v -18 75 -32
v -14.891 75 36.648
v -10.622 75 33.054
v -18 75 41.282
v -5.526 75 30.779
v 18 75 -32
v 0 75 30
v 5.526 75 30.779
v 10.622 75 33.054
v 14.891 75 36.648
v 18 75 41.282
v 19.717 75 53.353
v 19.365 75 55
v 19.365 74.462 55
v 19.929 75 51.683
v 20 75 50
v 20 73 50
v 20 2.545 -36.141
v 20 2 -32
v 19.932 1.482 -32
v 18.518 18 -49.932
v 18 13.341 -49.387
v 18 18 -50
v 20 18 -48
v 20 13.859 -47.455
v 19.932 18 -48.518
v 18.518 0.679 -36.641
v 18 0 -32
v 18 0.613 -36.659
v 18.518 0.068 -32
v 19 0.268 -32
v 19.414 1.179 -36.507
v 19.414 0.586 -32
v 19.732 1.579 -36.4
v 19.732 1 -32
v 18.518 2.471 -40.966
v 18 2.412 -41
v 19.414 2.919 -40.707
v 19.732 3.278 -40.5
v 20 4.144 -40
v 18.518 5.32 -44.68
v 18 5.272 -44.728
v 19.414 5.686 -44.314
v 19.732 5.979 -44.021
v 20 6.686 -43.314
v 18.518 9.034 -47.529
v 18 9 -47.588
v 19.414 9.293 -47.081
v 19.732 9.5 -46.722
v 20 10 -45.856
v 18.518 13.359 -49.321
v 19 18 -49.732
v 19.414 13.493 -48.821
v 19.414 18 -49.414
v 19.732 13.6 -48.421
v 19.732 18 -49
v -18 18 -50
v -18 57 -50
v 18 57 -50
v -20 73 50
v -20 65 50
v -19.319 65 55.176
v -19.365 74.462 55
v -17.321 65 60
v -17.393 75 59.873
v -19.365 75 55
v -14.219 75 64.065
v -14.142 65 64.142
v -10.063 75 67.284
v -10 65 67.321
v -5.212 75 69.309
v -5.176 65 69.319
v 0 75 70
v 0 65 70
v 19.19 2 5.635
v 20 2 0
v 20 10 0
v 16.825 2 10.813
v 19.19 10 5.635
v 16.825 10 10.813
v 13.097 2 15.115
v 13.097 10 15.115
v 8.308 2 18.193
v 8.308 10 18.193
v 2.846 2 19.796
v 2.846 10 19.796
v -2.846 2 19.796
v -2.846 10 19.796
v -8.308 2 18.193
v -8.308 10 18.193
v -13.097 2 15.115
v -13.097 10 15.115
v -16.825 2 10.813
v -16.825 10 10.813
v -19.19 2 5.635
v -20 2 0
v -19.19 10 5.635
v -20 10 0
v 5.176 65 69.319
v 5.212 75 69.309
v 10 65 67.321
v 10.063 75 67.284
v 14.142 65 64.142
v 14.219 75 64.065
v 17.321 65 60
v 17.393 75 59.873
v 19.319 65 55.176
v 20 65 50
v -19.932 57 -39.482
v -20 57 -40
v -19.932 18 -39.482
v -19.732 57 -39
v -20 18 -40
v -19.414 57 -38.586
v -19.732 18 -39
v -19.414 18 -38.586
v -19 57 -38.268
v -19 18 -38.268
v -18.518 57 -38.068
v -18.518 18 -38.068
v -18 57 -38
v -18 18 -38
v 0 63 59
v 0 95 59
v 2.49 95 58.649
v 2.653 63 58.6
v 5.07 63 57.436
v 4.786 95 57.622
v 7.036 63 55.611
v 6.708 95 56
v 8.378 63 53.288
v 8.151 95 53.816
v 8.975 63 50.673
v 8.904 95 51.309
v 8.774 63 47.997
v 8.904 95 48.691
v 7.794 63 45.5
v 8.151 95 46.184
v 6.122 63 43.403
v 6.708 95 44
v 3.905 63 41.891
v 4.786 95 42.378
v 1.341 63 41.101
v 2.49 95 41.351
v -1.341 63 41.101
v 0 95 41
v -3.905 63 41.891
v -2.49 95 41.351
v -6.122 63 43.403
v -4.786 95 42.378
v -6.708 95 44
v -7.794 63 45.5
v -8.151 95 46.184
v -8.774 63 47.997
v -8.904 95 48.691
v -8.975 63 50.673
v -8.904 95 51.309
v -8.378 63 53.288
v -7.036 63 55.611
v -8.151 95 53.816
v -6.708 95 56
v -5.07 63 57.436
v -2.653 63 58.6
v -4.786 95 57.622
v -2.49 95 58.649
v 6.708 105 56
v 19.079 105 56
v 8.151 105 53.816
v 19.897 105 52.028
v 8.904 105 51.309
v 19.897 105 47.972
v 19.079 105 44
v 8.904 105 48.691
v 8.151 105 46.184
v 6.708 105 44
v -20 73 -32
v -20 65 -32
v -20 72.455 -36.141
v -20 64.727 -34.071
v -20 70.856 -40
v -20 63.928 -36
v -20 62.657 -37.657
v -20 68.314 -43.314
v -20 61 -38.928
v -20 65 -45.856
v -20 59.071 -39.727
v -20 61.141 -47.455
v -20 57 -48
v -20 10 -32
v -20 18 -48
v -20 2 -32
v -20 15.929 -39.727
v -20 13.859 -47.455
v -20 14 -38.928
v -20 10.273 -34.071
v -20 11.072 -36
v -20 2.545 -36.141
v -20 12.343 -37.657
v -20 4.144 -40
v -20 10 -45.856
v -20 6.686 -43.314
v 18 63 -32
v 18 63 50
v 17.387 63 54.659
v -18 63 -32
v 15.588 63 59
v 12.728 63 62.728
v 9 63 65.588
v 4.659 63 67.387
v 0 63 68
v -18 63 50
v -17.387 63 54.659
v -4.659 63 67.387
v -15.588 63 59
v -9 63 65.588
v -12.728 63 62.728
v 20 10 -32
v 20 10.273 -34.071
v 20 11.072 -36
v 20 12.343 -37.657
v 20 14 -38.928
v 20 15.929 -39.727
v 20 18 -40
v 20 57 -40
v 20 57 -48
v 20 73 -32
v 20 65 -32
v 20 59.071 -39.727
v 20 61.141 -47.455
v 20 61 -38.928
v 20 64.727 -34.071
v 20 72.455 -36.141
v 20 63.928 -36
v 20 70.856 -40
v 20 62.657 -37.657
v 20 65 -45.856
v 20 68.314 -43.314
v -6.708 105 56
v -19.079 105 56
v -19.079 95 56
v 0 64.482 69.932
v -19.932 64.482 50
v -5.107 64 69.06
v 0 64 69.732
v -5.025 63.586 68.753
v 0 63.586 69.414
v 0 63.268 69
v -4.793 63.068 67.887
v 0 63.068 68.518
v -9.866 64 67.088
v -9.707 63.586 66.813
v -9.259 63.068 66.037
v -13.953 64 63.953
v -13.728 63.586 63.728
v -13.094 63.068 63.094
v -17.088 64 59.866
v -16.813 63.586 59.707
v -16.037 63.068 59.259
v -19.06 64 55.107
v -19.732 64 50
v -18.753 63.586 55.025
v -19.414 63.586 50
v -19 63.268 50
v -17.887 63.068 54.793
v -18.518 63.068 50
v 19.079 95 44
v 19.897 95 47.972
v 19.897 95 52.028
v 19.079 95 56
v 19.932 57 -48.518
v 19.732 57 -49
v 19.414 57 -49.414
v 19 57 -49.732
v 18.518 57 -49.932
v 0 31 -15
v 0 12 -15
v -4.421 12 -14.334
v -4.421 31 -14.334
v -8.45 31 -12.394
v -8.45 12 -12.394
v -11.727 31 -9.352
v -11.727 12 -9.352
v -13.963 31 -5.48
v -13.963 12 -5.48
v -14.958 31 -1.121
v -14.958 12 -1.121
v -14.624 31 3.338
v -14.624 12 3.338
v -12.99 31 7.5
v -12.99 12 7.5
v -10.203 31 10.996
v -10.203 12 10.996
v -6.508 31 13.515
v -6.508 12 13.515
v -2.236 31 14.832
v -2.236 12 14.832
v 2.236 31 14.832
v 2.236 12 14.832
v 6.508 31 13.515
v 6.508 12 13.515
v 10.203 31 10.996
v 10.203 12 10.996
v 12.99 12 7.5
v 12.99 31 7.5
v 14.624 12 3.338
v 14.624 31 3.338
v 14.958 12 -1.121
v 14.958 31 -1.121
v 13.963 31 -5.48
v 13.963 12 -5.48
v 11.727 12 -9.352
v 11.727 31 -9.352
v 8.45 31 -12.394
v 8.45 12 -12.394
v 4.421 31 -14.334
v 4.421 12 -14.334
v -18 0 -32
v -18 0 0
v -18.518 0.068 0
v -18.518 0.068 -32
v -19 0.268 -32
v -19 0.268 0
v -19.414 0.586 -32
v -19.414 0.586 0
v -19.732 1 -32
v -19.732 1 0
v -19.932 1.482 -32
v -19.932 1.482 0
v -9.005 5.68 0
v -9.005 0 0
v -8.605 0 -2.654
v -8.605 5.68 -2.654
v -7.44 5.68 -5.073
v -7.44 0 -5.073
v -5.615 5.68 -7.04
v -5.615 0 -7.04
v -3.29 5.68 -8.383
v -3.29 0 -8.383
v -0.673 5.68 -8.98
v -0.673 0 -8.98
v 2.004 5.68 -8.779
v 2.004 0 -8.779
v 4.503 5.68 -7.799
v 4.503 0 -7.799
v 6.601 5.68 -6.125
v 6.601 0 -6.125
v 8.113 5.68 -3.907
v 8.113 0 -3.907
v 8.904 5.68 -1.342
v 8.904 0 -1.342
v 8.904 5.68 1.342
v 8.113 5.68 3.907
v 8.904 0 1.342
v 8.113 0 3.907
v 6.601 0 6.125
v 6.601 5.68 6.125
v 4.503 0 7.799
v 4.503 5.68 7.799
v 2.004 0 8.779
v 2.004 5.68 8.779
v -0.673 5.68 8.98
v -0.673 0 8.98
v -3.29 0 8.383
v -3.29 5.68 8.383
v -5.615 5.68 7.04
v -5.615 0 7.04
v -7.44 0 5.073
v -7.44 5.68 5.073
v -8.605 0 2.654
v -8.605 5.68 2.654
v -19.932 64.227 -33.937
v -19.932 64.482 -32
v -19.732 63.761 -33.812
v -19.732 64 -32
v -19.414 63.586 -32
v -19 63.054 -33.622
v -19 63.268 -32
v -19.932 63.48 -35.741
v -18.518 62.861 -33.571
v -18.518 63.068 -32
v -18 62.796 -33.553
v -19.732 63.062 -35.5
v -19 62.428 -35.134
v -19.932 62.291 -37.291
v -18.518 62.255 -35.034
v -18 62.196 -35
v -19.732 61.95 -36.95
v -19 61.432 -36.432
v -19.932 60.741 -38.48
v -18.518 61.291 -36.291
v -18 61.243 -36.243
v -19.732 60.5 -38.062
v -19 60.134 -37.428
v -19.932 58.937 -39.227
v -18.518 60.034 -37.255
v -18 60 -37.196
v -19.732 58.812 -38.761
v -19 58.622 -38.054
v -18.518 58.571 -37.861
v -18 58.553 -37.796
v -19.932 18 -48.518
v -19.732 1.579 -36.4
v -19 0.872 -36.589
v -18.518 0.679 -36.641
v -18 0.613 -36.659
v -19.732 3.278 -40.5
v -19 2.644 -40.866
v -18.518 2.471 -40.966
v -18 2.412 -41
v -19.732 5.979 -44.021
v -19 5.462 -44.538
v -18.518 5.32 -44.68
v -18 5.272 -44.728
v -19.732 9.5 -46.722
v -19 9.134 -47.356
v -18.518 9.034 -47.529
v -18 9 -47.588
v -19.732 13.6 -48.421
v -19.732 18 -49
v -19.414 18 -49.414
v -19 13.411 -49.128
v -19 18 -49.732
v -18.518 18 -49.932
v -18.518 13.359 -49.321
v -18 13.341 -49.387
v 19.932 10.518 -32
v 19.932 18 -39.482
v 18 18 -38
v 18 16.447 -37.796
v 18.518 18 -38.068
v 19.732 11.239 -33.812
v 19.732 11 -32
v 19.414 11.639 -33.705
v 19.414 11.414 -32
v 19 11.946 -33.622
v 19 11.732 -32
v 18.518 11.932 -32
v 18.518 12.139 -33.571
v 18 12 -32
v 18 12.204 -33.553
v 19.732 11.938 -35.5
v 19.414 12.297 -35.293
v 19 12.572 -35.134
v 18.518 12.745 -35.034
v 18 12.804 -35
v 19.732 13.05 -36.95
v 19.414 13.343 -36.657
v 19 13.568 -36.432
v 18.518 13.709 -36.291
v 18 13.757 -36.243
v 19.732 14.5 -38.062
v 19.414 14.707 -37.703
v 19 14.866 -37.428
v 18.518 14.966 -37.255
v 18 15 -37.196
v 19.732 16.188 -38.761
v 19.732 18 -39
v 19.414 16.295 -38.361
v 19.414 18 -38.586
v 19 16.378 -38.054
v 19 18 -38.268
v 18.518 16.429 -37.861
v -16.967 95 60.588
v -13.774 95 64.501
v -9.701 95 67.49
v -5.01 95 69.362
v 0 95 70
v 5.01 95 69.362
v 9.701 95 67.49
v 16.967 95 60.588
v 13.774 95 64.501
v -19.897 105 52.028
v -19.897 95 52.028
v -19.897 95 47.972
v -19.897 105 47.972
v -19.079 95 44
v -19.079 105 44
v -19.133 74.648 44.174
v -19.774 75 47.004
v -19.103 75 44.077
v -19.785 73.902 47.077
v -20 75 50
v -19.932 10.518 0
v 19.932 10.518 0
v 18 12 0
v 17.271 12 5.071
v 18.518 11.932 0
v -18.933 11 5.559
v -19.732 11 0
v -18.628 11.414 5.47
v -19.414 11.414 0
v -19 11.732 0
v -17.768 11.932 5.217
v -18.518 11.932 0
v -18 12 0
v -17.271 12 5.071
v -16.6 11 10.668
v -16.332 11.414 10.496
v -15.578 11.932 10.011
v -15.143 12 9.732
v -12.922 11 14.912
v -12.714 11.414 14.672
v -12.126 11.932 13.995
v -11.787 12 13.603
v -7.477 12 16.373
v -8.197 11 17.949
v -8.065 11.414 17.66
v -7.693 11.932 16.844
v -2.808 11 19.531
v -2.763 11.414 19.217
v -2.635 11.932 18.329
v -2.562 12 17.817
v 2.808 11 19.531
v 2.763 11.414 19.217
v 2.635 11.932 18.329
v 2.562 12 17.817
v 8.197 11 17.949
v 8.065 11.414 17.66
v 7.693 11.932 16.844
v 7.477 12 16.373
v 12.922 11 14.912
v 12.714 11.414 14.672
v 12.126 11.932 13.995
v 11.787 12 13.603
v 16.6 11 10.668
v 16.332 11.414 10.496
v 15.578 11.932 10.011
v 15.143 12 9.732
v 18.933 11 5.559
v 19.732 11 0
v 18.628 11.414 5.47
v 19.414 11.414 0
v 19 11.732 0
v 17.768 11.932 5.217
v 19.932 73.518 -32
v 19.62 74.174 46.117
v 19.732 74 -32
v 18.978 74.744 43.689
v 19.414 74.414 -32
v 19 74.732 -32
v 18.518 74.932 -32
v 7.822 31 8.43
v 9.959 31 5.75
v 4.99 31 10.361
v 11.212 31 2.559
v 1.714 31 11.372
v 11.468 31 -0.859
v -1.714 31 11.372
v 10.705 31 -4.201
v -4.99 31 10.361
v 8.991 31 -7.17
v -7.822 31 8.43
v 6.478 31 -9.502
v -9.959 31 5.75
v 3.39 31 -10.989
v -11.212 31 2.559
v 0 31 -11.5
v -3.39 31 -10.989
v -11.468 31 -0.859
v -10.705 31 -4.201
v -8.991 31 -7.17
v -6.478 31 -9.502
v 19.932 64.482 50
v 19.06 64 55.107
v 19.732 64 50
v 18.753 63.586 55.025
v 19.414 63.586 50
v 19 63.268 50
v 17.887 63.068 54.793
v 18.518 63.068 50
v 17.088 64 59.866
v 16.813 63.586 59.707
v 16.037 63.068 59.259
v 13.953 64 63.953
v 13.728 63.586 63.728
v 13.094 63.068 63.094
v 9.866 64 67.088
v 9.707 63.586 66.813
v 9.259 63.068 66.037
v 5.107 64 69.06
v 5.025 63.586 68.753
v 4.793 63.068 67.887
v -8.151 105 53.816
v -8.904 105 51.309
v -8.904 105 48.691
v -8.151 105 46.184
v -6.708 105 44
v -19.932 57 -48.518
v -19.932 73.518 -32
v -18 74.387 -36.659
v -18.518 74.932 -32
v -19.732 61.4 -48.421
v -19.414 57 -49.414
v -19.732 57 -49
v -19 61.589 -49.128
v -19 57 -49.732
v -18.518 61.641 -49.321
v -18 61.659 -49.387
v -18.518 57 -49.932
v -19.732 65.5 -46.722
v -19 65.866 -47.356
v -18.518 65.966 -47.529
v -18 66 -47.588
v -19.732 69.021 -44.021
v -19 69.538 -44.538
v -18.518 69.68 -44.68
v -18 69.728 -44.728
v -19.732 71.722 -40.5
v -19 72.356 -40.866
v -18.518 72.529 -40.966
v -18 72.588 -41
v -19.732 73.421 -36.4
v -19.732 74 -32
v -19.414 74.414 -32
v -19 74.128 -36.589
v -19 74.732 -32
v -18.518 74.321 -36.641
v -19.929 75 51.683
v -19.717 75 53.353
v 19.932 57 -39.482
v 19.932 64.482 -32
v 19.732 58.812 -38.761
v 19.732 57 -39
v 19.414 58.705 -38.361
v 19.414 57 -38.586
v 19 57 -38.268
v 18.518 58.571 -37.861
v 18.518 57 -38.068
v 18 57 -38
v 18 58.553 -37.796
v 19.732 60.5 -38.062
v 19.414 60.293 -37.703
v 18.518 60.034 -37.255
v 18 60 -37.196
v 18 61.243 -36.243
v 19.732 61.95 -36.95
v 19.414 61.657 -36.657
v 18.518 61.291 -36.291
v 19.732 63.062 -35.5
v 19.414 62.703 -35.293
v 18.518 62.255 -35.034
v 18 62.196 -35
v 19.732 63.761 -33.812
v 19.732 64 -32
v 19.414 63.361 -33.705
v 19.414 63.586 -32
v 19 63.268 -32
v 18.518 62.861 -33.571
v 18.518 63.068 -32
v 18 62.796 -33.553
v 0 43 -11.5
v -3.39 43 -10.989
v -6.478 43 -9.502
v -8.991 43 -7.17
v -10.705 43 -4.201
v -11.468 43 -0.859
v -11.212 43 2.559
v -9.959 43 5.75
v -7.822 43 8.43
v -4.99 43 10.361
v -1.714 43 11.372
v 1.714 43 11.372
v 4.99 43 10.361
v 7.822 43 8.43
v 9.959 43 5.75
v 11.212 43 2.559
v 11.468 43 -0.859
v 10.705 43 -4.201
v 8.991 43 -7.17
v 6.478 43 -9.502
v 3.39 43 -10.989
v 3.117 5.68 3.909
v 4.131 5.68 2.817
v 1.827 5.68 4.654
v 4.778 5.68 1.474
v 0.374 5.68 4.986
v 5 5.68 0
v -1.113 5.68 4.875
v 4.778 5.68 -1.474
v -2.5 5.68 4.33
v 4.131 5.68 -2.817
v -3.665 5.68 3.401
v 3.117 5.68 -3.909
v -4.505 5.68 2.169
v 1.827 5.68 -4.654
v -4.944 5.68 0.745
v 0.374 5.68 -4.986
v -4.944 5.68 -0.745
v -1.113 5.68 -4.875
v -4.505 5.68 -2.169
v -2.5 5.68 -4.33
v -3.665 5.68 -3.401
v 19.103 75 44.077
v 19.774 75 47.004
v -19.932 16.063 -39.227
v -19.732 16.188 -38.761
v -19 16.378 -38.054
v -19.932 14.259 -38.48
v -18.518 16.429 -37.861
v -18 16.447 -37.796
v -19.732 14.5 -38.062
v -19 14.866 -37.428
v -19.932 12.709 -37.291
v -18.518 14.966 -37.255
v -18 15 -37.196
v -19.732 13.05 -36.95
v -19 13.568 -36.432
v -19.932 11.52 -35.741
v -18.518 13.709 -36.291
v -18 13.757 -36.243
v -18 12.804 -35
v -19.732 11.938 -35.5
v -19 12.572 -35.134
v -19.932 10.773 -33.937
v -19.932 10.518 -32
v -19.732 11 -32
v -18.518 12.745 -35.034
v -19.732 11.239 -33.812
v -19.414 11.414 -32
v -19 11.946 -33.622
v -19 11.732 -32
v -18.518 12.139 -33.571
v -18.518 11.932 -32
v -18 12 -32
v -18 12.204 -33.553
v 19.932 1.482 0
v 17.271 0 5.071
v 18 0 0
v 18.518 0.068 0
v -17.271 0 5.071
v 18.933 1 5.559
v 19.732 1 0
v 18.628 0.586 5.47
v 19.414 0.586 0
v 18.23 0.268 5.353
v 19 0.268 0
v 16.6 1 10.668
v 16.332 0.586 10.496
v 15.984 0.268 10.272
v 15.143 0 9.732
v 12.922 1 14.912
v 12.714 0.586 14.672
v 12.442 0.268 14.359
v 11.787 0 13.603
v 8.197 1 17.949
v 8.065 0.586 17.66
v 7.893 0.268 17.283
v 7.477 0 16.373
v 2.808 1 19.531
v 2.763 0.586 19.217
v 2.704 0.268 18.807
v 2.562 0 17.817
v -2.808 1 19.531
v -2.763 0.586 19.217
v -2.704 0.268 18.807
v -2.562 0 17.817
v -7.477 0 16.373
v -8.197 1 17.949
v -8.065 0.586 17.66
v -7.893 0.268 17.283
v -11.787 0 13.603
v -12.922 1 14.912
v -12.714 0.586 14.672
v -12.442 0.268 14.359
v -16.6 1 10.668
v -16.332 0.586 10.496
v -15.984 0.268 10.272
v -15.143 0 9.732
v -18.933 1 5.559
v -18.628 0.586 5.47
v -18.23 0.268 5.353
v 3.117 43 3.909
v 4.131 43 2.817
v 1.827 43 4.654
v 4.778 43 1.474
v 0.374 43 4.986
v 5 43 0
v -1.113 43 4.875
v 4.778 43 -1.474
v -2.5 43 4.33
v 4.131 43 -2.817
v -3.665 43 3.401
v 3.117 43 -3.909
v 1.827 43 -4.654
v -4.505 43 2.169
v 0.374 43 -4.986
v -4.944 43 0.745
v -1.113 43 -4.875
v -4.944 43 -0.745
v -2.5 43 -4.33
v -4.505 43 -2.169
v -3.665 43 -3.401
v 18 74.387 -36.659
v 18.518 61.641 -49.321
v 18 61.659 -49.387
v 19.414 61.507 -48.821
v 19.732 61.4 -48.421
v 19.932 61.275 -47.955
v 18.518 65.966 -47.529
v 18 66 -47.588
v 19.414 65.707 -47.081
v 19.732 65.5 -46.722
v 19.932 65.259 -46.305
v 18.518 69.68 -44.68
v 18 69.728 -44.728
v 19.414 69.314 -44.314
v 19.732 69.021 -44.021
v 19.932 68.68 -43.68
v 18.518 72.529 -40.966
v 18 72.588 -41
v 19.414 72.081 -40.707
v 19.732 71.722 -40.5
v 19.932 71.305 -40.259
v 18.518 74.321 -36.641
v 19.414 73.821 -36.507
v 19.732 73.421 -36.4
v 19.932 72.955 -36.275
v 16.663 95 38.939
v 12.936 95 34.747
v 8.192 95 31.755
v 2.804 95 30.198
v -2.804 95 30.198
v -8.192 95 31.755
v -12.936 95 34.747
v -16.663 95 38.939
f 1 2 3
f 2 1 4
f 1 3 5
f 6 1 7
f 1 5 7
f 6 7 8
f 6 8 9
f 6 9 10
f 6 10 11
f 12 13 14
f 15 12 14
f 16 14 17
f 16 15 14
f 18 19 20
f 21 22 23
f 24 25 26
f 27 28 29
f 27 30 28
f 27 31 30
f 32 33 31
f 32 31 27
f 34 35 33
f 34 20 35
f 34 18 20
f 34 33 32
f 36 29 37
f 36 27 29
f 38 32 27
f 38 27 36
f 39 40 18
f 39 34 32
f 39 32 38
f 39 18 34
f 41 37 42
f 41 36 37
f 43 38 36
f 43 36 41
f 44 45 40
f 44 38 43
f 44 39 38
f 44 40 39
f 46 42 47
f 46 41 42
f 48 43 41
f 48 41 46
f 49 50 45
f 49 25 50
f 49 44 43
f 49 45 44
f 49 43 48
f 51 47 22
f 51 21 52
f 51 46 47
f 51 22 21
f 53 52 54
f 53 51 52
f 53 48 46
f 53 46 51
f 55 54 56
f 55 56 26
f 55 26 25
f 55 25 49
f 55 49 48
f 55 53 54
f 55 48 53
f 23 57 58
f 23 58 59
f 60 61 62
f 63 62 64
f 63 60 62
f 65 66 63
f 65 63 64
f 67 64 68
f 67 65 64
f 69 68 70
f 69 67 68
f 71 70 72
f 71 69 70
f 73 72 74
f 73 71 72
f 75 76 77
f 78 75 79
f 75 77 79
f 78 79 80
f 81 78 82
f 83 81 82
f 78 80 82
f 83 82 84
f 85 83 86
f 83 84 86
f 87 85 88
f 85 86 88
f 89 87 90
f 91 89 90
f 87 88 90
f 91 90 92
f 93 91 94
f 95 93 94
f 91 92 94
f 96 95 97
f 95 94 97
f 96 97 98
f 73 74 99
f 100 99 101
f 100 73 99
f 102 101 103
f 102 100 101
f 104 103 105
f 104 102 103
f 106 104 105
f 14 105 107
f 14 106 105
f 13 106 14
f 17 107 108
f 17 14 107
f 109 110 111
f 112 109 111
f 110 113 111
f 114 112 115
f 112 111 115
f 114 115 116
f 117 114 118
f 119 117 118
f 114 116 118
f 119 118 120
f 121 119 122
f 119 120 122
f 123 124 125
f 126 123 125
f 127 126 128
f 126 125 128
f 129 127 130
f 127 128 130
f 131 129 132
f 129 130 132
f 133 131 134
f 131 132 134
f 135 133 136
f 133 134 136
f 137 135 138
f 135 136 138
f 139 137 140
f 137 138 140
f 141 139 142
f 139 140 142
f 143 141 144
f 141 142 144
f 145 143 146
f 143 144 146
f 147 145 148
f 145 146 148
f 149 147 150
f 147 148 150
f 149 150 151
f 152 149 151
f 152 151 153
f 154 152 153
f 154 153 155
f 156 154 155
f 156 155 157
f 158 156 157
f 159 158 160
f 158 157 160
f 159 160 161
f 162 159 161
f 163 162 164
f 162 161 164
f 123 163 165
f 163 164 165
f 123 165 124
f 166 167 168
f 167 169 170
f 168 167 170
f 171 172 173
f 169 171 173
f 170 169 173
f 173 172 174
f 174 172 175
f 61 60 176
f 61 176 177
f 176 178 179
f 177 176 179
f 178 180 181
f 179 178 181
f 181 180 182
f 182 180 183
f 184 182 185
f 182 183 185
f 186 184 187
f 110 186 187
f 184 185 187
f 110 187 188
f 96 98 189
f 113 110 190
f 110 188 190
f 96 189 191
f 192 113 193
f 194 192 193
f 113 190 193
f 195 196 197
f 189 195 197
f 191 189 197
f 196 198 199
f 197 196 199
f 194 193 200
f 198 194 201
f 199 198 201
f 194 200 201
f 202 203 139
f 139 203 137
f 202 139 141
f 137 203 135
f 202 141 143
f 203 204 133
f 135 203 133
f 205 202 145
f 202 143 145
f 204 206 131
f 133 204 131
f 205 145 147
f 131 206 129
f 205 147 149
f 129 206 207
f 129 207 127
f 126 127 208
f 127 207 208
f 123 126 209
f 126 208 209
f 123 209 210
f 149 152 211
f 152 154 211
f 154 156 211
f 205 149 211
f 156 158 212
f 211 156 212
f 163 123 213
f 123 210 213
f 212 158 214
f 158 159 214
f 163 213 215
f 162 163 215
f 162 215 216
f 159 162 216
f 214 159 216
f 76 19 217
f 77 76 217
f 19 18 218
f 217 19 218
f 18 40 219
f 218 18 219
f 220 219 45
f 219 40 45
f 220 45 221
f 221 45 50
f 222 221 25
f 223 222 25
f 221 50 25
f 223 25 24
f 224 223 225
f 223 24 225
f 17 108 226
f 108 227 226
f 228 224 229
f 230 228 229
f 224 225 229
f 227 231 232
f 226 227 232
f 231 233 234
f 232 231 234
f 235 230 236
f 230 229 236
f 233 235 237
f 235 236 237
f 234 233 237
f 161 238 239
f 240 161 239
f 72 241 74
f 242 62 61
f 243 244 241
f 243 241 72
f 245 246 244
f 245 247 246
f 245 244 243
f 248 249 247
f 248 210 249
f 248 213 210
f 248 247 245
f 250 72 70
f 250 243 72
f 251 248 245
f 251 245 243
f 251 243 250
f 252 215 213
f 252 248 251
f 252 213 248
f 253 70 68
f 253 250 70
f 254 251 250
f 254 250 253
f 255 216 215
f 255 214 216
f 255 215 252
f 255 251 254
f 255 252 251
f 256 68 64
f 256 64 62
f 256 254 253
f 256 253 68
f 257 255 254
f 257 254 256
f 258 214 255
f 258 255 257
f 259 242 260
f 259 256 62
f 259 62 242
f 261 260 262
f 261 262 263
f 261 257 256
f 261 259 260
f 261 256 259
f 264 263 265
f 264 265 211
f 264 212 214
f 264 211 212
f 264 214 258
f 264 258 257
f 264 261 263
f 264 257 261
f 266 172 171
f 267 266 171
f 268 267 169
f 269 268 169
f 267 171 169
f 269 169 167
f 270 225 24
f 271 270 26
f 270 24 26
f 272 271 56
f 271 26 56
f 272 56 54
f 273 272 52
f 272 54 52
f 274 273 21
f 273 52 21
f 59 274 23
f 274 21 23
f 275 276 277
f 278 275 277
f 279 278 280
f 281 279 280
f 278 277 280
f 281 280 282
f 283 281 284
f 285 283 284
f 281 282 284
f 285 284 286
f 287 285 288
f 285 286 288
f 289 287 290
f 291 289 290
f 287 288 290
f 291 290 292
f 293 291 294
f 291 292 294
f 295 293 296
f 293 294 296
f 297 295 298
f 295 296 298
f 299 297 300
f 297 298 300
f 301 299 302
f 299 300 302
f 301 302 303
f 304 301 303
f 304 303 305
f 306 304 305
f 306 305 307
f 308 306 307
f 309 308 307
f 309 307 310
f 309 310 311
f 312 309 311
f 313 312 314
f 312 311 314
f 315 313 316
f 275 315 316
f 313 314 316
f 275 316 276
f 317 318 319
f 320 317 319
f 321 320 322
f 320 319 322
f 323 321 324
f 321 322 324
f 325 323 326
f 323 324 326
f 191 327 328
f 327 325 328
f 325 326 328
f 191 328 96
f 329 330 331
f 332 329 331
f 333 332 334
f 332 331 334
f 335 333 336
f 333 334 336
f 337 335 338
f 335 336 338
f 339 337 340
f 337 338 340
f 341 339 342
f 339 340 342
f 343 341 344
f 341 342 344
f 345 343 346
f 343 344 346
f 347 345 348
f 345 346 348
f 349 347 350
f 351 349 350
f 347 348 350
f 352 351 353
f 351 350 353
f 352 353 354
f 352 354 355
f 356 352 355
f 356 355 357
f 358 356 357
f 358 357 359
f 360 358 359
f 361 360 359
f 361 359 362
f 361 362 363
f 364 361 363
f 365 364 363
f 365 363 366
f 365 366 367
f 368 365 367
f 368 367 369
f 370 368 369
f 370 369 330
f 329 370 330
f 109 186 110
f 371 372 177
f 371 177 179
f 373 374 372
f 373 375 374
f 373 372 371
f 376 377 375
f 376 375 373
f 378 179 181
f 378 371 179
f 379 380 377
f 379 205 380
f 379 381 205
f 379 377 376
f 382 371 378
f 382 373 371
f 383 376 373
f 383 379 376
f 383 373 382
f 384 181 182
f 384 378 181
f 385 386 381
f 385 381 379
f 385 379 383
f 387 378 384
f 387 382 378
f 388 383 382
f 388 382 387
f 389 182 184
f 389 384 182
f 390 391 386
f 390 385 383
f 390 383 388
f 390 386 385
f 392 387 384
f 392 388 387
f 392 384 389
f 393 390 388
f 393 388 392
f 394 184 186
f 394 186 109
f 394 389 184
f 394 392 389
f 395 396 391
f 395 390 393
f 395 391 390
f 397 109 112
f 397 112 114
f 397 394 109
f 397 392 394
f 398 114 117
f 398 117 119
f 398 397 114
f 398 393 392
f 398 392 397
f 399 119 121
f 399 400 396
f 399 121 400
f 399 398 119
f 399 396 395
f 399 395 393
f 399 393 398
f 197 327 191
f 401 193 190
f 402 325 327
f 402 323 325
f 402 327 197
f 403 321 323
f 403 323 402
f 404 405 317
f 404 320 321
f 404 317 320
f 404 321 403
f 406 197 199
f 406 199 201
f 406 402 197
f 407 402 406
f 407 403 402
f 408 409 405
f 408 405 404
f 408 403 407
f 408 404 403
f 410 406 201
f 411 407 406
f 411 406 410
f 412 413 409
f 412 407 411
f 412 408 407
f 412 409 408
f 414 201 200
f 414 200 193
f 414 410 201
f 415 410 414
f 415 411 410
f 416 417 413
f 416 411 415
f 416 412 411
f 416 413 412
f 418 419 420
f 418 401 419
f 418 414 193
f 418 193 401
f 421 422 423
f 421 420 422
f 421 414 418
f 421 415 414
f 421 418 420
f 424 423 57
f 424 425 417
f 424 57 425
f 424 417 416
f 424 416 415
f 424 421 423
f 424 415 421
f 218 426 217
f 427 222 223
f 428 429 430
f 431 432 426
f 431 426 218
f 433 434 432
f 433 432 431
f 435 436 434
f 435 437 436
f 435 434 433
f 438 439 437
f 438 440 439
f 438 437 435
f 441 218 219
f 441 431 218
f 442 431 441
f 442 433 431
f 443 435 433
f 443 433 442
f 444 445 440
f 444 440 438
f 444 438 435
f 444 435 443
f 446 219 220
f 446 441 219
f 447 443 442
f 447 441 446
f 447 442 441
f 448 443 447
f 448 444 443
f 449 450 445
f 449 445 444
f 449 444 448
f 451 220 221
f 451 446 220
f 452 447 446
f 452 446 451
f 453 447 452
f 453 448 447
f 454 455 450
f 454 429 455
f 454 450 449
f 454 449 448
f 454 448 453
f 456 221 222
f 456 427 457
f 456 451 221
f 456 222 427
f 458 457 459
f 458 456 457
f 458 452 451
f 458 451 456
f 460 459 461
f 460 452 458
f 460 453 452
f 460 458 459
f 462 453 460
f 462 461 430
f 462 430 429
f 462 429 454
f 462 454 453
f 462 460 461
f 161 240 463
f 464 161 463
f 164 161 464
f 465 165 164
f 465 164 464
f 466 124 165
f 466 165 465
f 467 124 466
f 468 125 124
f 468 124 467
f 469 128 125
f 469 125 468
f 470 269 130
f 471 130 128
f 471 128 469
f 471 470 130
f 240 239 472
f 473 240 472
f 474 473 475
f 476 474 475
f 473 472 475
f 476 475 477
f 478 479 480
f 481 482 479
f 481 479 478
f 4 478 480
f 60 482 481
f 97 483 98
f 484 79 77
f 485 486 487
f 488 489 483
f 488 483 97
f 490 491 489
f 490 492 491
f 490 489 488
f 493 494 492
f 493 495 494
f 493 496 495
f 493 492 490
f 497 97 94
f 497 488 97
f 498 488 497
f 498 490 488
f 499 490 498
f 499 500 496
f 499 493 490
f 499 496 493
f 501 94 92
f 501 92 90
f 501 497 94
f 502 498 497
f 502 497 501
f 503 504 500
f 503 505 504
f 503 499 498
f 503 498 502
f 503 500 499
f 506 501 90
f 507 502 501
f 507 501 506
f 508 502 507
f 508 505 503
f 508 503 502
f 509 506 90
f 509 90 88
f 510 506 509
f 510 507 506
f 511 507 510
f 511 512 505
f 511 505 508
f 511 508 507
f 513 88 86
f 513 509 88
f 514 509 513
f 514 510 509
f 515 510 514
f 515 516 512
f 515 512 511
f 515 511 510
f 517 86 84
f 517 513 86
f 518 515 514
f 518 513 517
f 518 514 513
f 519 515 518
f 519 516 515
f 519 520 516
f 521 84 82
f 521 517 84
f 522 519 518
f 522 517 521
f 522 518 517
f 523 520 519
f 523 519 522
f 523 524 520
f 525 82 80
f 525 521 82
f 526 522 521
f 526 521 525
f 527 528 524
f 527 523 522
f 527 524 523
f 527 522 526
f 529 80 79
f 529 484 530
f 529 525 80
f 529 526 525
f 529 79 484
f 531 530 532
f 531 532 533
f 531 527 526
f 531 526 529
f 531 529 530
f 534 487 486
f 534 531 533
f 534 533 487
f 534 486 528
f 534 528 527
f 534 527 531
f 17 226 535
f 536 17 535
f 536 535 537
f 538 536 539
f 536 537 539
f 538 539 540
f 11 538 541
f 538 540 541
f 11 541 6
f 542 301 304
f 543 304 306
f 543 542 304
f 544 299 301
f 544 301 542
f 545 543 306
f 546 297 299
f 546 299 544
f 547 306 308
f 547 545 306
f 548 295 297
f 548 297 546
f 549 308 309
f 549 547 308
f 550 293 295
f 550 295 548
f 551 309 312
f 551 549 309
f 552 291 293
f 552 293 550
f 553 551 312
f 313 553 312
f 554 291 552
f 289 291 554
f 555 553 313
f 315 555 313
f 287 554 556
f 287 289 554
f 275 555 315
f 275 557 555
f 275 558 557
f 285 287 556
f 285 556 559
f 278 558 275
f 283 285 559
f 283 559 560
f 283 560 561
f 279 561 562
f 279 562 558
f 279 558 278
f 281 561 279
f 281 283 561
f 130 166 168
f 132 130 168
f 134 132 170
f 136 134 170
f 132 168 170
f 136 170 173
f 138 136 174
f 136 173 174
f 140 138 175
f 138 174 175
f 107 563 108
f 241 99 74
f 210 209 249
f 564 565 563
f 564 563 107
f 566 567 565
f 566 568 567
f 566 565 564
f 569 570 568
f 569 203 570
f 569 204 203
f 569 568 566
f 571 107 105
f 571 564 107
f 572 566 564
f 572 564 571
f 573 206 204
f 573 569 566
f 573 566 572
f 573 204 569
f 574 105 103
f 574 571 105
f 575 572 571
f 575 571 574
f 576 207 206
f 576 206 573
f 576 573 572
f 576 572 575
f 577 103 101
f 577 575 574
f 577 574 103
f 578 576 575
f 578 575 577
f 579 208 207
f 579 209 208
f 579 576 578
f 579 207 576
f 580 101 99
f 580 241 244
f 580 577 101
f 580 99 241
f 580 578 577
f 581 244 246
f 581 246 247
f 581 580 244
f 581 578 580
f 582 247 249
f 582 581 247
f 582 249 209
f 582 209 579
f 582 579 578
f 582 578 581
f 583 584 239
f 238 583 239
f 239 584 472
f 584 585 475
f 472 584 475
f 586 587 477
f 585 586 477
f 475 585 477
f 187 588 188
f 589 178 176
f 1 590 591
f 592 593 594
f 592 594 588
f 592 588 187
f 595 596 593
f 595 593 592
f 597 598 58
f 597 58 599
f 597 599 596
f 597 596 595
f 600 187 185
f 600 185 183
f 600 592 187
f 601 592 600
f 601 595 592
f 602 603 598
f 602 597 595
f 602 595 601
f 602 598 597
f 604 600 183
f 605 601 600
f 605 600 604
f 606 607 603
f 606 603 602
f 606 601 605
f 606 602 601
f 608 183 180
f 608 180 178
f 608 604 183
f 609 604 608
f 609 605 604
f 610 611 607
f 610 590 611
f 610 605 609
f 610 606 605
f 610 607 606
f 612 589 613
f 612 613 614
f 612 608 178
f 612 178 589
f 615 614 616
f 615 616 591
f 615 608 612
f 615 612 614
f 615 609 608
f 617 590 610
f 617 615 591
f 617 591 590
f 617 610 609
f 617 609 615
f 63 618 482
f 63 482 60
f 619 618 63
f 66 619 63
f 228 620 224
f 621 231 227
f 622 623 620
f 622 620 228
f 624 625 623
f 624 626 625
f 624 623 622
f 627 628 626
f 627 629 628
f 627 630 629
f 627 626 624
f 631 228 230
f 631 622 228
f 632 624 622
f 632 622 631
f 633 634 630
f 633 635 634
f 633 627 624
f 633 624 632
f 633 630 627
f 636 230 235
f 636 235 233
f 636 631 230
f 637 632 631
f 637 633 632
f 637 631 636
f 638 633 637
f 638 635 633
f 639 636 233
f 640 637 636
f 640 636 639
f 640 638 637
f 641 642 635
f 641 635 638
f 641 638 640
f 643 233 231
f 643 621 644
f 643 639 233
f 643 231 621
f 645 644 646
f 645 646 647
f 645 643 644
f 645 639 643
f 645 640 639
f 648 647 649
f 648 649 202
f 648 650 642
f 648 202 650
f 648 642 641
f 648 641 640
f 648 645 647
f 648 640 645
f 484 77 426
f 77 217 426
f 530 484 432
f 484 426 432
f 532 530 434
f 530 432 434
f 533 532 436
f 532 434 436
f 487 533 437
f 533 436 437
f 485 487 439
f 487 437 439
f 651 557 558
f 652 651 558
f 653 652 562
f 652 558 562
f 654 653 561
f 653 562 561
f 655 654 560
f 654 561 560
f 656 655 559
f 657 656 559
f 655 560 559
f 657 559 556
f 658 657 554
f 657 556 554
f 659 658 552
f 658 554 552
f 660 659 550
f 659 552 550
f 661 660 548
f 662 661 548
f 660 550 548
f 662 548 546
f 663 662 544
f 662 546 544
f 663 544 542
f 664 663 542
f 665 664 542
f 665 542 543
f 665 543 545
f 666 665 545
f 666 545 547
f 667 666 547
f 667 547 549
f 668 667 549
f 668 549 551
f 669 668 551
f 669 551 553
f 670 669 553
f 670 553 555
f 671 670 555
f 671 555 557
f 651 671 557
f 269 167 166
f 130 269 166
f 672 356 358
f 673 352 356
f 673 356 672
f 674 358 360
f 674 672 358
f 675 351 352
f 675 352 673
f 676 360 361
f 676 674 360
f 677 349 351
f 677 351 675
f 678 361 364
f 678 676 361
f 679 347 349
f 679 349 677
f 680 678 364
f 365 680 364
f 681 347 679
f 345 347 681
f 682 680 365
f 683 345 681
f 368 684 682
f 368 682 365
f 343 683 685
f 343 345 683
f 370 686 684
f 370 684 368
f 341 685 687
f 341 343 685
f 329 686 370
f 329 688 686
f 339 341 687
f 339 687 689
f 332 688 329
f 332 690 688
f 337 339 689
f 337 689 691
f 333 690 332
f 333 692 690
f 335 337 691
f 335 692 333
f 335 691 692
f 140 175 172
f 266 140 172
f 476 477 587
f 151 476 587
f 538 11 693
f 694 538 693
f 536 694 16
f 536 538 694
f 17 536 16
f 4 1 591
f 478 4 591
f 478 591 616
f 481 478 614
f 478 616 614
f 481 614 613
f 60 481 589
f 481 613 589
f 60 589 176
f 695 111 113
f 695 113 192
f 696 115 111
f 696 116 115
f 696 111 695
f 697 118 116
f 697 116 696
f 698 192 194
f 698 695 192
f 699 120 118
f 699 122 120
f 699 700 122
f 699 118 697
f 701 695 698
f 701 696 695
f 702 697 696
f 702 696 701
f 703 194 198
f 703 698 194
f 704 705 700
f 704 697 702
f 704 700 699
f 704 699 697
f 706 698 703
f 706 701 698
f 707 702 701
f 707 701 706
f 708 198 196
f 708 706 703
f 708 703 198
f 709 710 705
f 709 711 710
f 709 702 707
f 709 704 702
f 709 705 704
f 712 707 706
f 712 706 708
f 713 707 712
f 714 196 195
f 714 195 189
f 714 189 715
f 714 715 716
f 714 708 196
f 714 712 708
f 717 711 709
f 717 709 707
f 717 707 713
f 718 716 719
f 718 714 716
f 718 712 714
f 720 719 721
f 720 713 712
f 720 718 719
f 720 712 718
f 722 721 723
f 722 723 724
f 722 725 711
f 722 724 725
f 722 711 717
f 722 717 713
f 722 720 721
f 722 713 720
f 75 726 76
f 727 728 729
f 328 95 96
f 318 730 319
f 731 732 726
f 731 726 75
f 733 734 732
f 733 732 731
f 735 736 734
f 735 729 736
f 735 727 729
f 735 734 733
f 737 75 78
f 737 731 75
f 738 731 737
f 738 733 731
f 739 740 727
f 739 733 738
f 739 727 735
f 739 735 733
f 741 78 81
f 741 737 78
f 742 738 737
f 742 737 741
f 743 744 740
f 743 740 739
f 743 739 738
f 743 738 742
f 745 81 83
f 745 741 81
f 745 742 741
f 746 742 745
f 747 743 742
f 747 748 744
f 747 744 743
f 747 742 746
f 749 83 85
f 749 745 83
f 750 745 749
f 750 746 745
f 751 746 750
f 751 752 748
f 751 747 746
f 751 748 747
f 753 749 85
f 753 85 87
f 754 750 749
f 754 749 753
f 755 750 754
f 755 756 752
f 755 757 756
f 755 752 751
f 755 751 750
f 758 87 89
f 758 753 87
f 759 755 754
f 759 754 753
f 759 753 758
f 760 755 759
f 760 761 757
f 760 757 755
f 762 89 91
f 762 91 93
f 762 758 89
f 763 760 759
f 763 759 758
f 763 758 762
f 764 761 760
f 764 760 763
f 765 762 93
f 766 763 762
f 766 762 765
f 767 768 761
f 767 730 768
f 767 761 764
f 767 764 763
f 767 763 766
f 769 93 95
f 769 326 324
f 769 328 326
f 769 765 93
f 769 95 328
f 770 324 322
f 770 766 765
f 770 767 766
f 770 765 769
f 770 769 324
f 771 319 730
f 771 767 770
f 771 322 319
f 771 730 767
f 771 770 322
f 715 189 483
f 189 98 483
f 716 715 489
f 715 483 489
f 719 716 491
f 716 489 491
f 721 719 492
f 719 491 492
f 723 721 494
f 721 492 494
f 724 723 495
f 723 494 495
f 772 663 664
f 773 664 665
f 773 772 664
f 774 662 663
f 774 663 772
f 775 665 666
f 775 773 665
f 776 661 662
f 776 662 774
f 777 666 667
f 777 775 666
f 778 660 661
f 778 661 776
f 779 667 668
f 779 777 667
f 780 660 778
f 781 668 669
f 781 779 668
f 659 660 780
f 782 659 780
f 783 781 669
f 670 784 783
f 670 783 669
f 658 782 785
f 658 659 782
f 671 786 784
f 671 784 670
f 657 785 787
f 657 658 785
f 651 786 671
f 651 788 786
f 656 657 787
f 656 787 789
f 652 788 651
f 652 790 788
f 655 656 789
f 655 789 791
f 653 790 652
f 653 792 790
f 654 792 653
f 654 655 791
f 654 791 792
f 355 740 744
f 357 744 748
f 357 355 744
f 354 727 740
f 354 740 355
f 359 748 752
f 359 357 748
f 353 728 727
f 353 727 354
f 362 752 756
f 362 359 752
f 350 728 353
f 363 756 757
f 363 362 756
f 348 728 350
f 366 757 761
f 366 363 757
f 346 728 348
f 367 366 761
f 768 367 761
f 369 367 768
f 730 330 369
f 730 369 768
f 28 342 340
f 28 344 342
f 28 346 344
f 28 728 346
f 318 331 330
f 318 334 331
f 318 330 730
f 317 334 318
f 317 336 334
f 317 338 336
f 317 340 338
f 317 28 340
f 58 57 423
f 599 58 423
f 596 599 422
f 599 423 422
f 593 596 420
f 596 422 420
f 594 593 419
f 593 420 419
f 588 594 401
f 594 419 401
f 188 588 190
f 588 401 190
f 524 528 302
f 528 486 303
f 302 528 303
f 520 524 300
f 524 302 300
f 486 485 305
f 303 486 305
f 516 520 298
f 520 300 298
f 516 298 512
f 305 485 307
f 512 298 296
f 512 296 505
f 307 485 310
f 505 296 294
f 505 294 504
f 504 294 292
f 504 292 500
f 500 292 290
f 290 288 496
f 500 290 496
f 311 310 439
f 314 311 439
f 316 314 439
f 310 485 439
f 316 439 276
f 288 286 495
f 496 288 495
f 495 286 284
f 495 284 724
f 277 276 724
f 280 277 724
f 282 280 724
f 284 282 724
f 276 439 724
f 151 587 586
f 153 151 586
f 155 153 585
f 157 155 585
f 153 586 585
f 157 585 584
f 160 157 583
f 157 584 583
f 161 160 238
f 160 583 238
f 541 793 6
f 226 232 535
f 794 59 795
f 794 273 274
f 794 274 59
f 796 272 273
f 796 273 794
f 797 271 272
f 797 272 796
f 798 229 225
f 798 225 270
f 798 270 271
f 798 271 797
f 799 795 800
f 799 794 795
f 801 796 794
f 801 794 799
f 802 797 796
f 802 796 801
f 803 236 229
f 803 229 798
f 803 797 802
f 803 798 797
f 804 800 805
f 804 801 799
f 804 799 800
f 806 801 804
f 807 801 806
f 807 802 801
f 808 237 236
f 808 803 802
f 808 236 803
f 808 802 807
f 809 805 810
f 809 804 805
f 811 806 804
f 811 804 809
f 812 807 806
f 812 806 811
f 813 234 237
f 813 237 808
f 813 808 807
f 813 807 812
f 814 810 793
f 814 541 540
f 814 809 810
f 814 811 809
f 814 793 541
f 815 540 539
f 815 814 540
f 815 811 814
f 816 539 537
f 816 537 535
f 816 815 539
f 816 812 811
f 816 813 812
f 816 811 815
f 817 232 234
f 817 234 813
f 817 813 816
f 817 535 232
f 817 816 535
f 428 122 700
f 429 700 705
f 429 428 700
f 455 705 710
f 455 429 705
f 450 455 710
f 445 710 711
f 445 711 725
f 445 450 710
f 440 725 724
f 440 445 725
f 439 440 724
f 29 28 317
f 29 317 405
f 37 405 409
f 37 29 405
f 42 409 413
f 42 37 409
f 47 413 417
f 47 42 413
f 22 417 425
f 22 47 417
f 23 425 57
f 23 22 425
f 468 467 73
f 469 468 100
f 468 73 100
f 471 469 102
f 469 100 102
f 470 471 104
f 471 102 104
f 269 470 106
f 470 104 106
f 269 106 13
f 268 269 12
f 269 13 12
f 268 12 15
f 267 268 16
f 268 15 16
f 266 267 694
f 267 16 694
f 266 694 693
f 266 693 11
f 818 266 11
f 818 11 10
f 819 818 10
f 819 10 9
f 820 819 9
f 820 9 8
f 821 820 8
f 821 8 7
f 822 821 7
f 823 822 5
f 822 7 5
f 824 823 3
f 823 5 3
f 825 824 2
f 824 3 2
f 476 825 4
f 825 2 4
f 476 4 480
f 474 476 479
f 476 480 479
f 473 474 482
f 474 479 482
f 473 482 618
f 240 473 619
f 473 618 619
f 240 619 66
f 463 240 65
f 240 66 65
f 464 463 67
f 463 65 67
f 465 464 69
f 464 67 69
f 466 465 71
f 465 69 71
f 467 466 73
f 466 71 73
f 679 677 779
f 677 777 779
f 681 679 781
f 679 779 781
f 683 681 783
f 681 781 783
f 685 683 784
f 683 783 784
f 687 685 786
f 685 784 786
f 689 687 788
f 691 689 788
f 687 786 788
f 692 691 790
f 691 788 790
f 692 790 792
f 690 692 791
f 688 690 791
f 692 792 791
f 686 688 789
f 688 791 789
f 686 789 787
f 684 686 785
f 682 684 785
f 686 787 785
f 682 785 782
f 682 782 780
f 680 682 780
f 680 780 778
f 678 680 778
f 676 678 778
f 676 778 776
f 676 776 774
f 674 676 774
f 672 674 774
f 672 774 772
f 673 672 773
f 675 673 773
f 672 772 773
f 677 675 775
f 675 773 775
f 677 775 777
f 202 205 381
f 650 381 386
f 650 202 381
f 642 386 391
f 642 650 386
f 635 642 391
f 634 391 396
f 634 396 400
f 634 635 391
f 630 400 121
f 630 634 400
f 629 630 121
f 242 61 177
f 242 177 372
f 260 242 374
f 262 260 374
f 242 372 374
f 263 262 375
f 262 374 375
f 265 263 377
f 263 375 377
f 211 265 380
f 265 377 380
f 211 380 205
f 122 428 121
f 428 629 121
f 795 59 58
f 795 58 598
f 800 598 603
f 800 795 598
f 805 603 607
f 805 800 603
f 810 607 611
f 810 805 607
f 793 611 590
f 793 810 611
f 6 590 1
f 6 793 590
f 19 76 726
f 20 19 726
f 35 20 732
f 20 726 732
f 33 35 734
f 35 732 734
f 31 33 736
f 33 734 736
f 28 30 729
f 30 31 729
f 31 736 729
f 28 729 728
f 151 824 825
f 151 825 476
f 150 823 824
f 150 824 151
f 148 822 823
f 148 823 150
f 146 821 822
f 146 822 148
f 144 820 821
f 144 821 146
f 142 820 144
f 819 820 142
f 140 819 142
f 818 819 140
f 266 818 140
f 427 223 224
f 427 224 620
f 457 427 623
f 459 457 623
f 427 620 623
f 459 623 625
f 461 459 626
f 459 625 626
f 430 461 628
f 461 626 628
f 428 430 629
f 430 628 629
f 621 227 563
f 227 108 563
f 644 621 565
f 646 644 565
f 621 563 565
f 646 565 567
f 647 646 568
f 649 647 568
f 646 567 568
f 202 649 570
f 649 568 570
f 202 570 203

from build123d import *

# Parameters (mm, degrees)
SKETCH3_W                               = 40
SKETCH3_H                               = 12
BOSS_EXTRUDE1_DEPTH                     = 12
SKETCH5_R                               = 20
BOSS_EXTRUDE2_DEPTH                     = 20
BOSS_EXTRUDE2_DIRECTION_2_REACH         = 94.331
SKETCH7_R                               = 11.5
BOSS_EXTRUDE4_DEPTH                     = 31
SKETCH8_R                               = 15
BOSS_EXTRUDE5_DEPTH                     = 19
SKETCH9_R                               = 9
CUT_EXTRUDE1_DEPTH                      = 32
BOSS_EXTRUDE6_START                     = 10
BOSS_EXTRUDE6_DEPTH                     = 10
CBORE_FOR_M8_HEX_HEAD_BOLT1_D           = 10
CBORE_FOR_M8_HEX_HEAD_BOLT1_DEPTH       = 43
CBORE_FOR_M8_HEX_HEAD_BOLT1_CBORE_D     = 18.01
CBORE_FOR_M8_HEX_HEAD_BOLT1_CBORE_DEPTH = 5.68
CBORE_FOR_M8_HEX_HEAD_BOLT1_TIP         = 3.004303095
FILLET2_R                               = 18
FILLET3_R                               = 2
FILLET4_R                               = 6
FILLET5_R                               = 2


with BuildPart() as part:
    # Sweep1: sweep along a path in Sketch2
    with BuildLine(Plane(origin=(0, 0, 0), x_dir=(0, 0, -1), z_dir=(1, 0, 0))) as sweep1_path:
        Line((0, 0), (50, 0))
        Line((50, 0), (50, 75))
        Line((50, 75), (-50, 75))
    # Sketch3 → Sweep1 (sweep)
    with BuildSketch(Plane.XY):
        with Locations((0, 6)):
            Rectangle(SKETCH3_W, SKETCH3_H)
    sweep(path=sweep1_path.line, transition=Transition.RIGHT)

    # Sketch4 → Boss-Extrude1 (add)
    with BuildSketch(Plane(origin=(0, 12, 0), x_dir=(1, 0, 0), z_dir=(0, 1, 0))):
        with BuildLine():
            Line((-20, 0), (20, 0))
            ThreePointArc((20, 0), (0, -20), (-20, 0))
        make_face()
    extrude(amount=-BOSS_EXTRUDE1_DEPTH)

    # Sketch5 → Boss-Extrude2 (add)
    with BuildSketch(Plane(origin=(0, 75, 0), x_dir=(1, 0, 0), z_dir=(0, 1, 0))):
        with Locations(Location((0, -50, 0), (0, 0, 270))):
            Circle(SKETCH5_R)
    extrude(amount=BOSS_EXTRUDE2_DEPTH)

    # Boss-Extrude2 direction 2: up to this face of the body (flat: up to its plane)
    boss_extrude2_direction_2_end = Plane(part.part.faces().sort_by_distance((0, 63, 6))[0])
    # Sketch5 → Boss-Extrude2 direction 2 (add, up to the picked face)
    with BuildSketch(Plane(origin=(0, 75, 0), x_dir=(1, 0, 0), z_dir=(0, 1, 0)), mode=Mode.PRIVATE) as boss_extrude2_direction_2_sk1:
        with Locations(Location((0, -50, 0), (0, 0, 270))):
            Circle(SKETCH5_R)
    boss_extrude2_direction_2_tool1 = split(extrude(boss_extrude2_direction_2_sk1.sketch, amount=-BOSS_EXTRUDE2_DIRECTION_2_REACH, mode=Mode.PRIVATE), bisect_by=boss_extrude2_direction_2_end, keep=Keep.BOTH, mode=Mode.PRIVATE)
    add(boss_extrude2_direction_2_tool1.solids().sort_by(Axis((0, 75, 50), (0, -1, 0)))[0])

    # Sketch7 → Boss-Extrude4 (add)
    with BuildSketch(Plane(origin=(0, 12, 0), x_dir=(1, 0, 0), z_dir=(0, 1, 0))):
        with Locations(Location((0, 0, 0), (0, 0, 90))):
            Circle(SKETCH7_R)
    extrude(amount=BOSS_EXTRUDE4_DEPTH)

    # Sketch8 → Boss-Extrude5 (add)
    with BuildSketch(Plane(origin=(0, 12, 0), x_dir=(1, 0, 0), z_dir=(0, 1, 0))):
        with Locations(Location((0, 0, 0), (0, 0, 90))):
            Circle(SKETCH8_R)
    extrude(amount=BOSS_EXTRUDE5_DEPTH)

    # Sketch9 → Cut-Extrude1 (cut)
    with BuildSketch(Plane(origin=(0, 95, 0), x_dir=(1, 0, 0), z_dir=(0, 1, 0))):
        with Locations(Location((0, -50, 0), (0, 0, 270))):
            Circle(SKETCH9_R)
    extrude(amount=-CUT_EXTRUDE1_DEPTH, mode=Mode.SUBTRACT)

    # Sketch10 → Boss-Extrude6 (add)
    with BuildSketch(Plane(origin=(0, 95, 0), x_dir=(1, 0, 0), z_dir=(0, 1, 0)).offset(BOSS_EXTRUDE6_START)):
        with BuildLine():
            Line((-19.078784028, -44), (-6.708203932, -44))
            ThreePointArc((-6.708203932, -44), (-9, -50), (-6.708203932, -56))
            Line((-6.708203932, -56), (-19.078784028, -56))
            ThreePointArc((-19.078784028, -56), (-20, -50), (-19.078784028, -44))
        make_face()
        with BuildLine():
            Line((6.708203932, -44), (19.078784028, -44))
            ThreePointArc((19.078784028, -44), (20, -50), (19.078784028, -56))
            Line((19.078784028, -56), (6.708203932, -56))
            ThreePointArc((6.708203932, -56), (9, -50), (6.708203932, -44))
        make_face()
    extrude(amount=-BOSS_EXTRUDE6_DEPTH)

    # CBORE for M8 Hex Head Bolt1
    with Locations(Plane(origin=(0, 0, 0), x_dir=(-1, 0, 0), z_dir=(0, -1, 0))):
        with Locations((0, 0)):
            CounterBoreHole(CBORE_FOR_M8_HEX_HEAD_BOLT1_D / 2, CBORE_FOR_M8_HEX_HEAD_BOLT1_CBORE_D / 2, CBORE_FOR_M8_HEX_HEAD_BOLT1_CBORE_DEPTH, depth=CBORE_FOR_M8_HEX_HEAD_BOLT1_DEPTH)
            with Locations((0, 0, -(CBORE_FOR_M8_HEX_HEAD_BOLT1_DEPTH + CBORE_FOR_M8_HEX_HEAD_BOLT1_TIP / 2))):  # 118° drill point
                Cone(0, CBORE_FOR_M8_HEX_HEAD_BOLT1_D / 2, CBORE_FOR_M8_HEX_HEAD_BOLT1_TIP, mode=Mode.SUBTRACT)

    # Fillet2
    fillet2_edges = [part.edges().sort_by_distance(p)[0] for p in [
        (0, 75, -50),
        (0, 0, -50),
    ]]
    fillet(fillet2_edges, radius=FILLET2_R)

    # Fillet3
    # the kernel refuses this fillet: 2 mm, written as the material it takes off along each edge
    with BuildSketch(Plane(origin=(20, 18, -32), x_dir=(0, -1, 0), z_dir=(0, 0, 1))) as fillet3_piece_1:
        with BuildLine():
            CenterArc((18 - FILLET3_R, -FILLET3_R), FILLET3_R, 0, 90)
            Line((18 - FILLET3_R, 0), (18, 0))
            Line((18, 0), (18, -FILLET3_R))
        make_face()
    revolve(axis=Axis((20, 18, -32), (1, 0, 0)), revolution_arc=90, mode=Mode.SUBTRACT)
    with BuildSketch(Plane(origin=(20, 18, -50), x_dir=(0, 0, 1), z_dir=(0, 1, 0))) as fillet3_piece_2:
        with BuildLine():
            CenterArc((FILLET3_R, -FILLET3_R), FILLET3_R, 90, 90)
            Line((0, -FILLET3_R), (0, 0))
            Line((0, 0), (FILLET3_R, 0))
        make_face()
    extrude(amount=39, mode=Mode.SUBTRACT)
    with BuildSketch(Plane(origin=(20, 57, -32), x_dir=(0, 0, -1), z_dir=(0, -1, 0))) as fillet3_piece_3:
        with BuildLine():
            CenterArc((18 - FILLET3_R, -FILLET3_R), FILLET3_R, 360, 90)
            Line((18, -FILLET3_R), (18, 0))
            Line((18, 0), (18 - FILLET3_R, 0))
        make_face()
    revolve(axis=Axis((20, 57, -32), (1, 0, 0)), revolution_arc=90, mode=Mode.SUBTRACT)
    with BuildSketch(Plane(origin=(-20, 18, -50), x_dir=(0, 0, 1), z_dir=(0, 1, 0))) as fillet3_piece_4:
        with BuildLine():
            CenterArc((FILLET3_R, FILLET3_R), FILLET3_R, 180, 90)
            Line((0, FILLET3_R), (0, 0))
            Line((0, 0), (FILLET3_R, 0))
        make_face()
    extrude(amount=39, mode=Mode.SUBTRACT)
    with BuildSketch(Plane(origin=(-20, 57, -32), x_dir=(0, 0, -1), z_dir=(0, -1, 0))) as fillet3_piece_5:
        with BuildLine():
            CenterArc((18 - FILLET3_R, FILLET3_R), FILLET3_R, 270, 90)
            Line((18, FILLET3_R), (18, 0))
            Line((18, 0), (18 - FILLET3_R, 0))
        make_face()
    revolve(axis=Axis((-20, 57, -32), (1, 0, 0)), revolution_arc=90, mode=Mode.SUBTRACT)
    with BuildSketch(Plane(origin=(-20, 18, -32), x_dir=(0, -1, 0), z_dir=(0, 0, 1))) as fillet3_piece_6:
        with BuildLine():
            CenterArc((18 - FILLET3_R, FILLET3_R), FILLET3_R, 270, 90)
            Line((18, FILLET3_R), (18, 0))
            Line((18, 0), (18 - FILLET3_R, 0))
        make_face()
    revolve(axis=Axis((-20, 18, -32), (1, 0, 0)), revolution_arc=90, mode=Mode.SUBTRACT)
    with BuildSketch(Plane(origin=(20, 75, -32), x_dir=(0, -1, 0), z_dir=(0, 0, 1))) as fillet3_piece_7_section:
        with BuildLine():
            CenterArc((FILLET3_R, -FILLET3_R), FILLET3_R, 90, 90)
            Line((0, -FILLET3_R), (0, 0))
            Line((0, 0), (FILLET3_R, 0))
        make_face()
    fillet3_piece_7 = extrude(amount=87, mode=Mode.PRIVATE)
    fillet3_piece_7 = fillet3_piece_7 - Plane(origin=(0, 74.534164158, 50), x_dir=(0, 0, 1), z_dir=(0, -1, 0)) * Cylinder(20, 183, mode=Mode.PRIVATE)
    add(fillet3_piece_7, mode=Mode.SUBTRACT)
    with BuildSketch(Plane(origin=(-20, 75, -32), x_dir=(0, -1, 0), z_dir=(0, 0, 1))) as fillet3_piece_8_section:
        with BuildLine():
            CenterArc((FILLET3_R, FILLET3_R), FILLET3_R, 180, 90)
            Line((0, FILLET3_R), (0, 0))
            Line((0, 0), (FILLET3_R, 0))
        make_face()
    fillet3_piece_8 = extrude(amount=87, mode=Mode.PRIVATE)
    fillet3_piece_8 = fillet3_piece_8 - Plane(origin=(0, 74.534164167, 50), x_dir=(0, 0, 1), z_dir=(0, -1, 0)) * Cylinder(20, 183, mode=Mode.PRIVATE)
    add(fillet3_piece_8, mode=Mode.SUBTRACT)
    with BuildSketch(Plane(origin=(-20, 0, 0), x_dir=(1, 0, 0), z_dir=(0, 0, -1))) as fillet3_piece_9:
        with BuildLine():
            CenterArc((FILLET3_R, -FILLET3_R), FILLET3_R, 90, 90)
            Line((0, -FILLET3_R), (0, 0))
            Line((0, 0), (FILLET3_R, 0))
        make_face()
    extrude(amount=32, mode=Mode.SUBTRACT)
    with BuildSketch(Plane(origin=(0, 0, 0), x_dir=(1, 0, 0), z_dir=(0, 0, -1))) as fillet3_piece_10:
        with BuildLine():
            CenterArc((20 - FILLET3_R, -FILLET3_R), FILLET3_R, 0, 90)
            Line((20, -FILLET3_R), (20, 0))
            Line((20, 0), (20 - FILLET3_R, 0))
        make_face()
    revolve(axis=Axis((0, 0, 0), (0, -1, 0)), revolution_arc=180, mode=Mode.SUBTRACT)
    with BuildSketch(Plane(origin=(20, 0, 0), x_dir=(-1, 0, 0), z_dir=(0, 0, -1))) as fillet3_piece_11:
        with BuildLine():
            CenterArc((FILLET3_R, FILLET3_R), FILLET3_R, 180, 90)
            Line((0, FILLET3_R), (0, 0))
            Line((0, 0), (FILLET3_R, 0))
        make_face()
    extrude(amount=32, mode=Mode.SUBTRACT)

    # Fillet4
    fillet4_edges = [part.edges().sort_by_distance(p)[0] for p in [
        (0, 63, -38),
        (0, 12, -38),
    ]]
    fillet(fillet4_edges, radius=FILLET4_R)

    # Fillet5
    fillet5_edges = [part.edges().sort_by_distance(p)[0] for p in [
        (20, 63, 9),
        (-20, 63, 9),
        (-20, 37.5, -38),
        (20, 37.5, -38),
        (20, 61.242640687, -36.242640687),
        (20, 61.242640687, -36.242640687),
        (-20, 61.242640687, -36.242640687),
        (-20, 61.242640687, -36.242640687),
        (20, 13.757359313, -36.242640687),
        (20, 13.757359313, -36.242640687),
        (-20, 13.757359313, -36.242640687),
        (-20, 13.757359313, -36.242640687),
        (-20, 12, -16),
        (0, 12, 20),
        (20, 12, -16),
        (-14.142135624, 63, 64.142135624),
    ]]
    fillet(fillet5_edges, radius=FILLET5_R)


solid = part.part
